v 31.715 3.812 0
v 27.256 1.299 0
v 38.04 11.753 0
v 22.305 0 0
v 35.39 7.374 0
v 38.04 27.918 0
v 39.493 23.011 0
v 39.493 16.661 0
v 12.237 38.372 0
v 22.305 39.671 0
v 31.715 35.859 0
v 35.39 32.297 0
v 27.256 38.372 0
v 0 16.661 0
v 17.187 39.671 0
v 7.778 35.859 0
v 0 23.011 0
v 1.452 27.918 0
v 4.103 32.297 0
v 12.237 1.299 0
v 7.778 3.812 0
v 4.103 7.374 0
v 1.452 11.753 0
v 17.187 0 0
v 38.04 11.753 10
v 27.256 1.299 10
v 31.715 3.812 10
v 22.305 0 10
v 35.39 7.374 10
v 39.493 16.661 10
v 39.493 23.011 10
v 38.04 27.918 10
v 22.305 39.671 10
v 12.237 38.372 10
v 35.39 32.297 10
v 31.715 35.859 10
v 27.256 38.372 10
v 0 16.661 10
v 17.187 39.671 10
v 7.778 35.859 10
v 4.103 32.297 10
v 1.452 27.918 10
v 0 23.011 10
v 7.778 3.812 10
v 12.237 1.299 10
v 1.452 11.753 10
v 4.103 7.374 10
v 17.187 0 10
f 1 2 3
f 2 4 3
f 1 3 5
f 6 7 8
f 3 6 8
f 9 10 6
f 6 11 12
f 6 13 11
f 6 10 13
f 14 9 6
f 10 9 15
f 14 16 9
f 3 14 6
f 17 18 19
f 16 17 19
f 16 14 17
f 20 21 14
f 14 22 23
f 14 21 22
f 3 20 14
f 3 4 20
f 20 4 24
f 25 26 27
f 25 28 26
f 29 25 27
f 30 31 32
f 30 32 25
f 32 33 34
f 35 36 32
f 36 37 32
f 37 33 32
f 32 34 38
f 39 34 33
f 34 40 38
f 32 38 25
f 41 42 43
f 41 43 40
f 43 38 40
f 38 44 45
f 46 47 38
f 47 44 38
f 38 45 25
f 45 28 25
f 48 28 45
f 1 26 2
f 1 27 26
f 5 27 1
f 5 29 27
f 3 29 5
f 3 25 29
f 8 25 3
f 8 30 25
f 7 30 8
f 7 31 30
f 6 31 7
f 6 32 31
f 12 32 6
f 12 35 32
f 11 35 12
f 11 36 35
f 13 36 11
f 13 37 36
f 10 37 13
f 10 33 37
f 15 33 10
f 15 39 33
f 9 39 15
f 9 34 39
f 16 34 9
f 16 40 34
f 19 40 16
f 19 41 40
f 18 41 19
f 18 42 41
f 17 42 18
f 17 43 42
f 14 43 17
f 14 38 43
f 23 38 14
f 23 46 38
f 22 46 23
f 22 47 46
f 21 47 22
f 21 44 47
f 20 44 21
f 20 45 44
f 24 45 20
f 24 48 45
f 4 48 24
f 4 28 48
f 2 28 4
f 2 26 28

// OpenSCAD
$fn = 32;

// ----------------------------------------------------------------------
// Flat adaptor: double_d, 10 mm thick
// ----------------------------------------------------------------------

// --- parameters (mm) ---
profile_height = 10;      // extrusion height
profile_points = 24;      // points of the closed outline

profile = [[39.493, 23.011], [38.04, 27.918], [35.39, 32.297], [31.715, 35.859], [27.256, 38.372], [22.305, 39.671], [17.187, 39.671], [12.237, 38.372], [7.778, 35.859], [4.103, 32.297], [1.452, 27.918], [0, 23.011], [0, 16.661], [1.452, 11.753], [4.103, 7.374], [7.778, 3.812], [12.237, 1.299], [17.187, 0], [22.305, 0], [27.256, 1.299], [31.715, 3.812], [35.39, 7.374], [38.04, 11.753], [39.493, 16.661]];  // single closed polygon, 24 points, counter clockwise

// --- the one profile operation ---
linear_extrude(height = profile_height) polygon(points = profile);
